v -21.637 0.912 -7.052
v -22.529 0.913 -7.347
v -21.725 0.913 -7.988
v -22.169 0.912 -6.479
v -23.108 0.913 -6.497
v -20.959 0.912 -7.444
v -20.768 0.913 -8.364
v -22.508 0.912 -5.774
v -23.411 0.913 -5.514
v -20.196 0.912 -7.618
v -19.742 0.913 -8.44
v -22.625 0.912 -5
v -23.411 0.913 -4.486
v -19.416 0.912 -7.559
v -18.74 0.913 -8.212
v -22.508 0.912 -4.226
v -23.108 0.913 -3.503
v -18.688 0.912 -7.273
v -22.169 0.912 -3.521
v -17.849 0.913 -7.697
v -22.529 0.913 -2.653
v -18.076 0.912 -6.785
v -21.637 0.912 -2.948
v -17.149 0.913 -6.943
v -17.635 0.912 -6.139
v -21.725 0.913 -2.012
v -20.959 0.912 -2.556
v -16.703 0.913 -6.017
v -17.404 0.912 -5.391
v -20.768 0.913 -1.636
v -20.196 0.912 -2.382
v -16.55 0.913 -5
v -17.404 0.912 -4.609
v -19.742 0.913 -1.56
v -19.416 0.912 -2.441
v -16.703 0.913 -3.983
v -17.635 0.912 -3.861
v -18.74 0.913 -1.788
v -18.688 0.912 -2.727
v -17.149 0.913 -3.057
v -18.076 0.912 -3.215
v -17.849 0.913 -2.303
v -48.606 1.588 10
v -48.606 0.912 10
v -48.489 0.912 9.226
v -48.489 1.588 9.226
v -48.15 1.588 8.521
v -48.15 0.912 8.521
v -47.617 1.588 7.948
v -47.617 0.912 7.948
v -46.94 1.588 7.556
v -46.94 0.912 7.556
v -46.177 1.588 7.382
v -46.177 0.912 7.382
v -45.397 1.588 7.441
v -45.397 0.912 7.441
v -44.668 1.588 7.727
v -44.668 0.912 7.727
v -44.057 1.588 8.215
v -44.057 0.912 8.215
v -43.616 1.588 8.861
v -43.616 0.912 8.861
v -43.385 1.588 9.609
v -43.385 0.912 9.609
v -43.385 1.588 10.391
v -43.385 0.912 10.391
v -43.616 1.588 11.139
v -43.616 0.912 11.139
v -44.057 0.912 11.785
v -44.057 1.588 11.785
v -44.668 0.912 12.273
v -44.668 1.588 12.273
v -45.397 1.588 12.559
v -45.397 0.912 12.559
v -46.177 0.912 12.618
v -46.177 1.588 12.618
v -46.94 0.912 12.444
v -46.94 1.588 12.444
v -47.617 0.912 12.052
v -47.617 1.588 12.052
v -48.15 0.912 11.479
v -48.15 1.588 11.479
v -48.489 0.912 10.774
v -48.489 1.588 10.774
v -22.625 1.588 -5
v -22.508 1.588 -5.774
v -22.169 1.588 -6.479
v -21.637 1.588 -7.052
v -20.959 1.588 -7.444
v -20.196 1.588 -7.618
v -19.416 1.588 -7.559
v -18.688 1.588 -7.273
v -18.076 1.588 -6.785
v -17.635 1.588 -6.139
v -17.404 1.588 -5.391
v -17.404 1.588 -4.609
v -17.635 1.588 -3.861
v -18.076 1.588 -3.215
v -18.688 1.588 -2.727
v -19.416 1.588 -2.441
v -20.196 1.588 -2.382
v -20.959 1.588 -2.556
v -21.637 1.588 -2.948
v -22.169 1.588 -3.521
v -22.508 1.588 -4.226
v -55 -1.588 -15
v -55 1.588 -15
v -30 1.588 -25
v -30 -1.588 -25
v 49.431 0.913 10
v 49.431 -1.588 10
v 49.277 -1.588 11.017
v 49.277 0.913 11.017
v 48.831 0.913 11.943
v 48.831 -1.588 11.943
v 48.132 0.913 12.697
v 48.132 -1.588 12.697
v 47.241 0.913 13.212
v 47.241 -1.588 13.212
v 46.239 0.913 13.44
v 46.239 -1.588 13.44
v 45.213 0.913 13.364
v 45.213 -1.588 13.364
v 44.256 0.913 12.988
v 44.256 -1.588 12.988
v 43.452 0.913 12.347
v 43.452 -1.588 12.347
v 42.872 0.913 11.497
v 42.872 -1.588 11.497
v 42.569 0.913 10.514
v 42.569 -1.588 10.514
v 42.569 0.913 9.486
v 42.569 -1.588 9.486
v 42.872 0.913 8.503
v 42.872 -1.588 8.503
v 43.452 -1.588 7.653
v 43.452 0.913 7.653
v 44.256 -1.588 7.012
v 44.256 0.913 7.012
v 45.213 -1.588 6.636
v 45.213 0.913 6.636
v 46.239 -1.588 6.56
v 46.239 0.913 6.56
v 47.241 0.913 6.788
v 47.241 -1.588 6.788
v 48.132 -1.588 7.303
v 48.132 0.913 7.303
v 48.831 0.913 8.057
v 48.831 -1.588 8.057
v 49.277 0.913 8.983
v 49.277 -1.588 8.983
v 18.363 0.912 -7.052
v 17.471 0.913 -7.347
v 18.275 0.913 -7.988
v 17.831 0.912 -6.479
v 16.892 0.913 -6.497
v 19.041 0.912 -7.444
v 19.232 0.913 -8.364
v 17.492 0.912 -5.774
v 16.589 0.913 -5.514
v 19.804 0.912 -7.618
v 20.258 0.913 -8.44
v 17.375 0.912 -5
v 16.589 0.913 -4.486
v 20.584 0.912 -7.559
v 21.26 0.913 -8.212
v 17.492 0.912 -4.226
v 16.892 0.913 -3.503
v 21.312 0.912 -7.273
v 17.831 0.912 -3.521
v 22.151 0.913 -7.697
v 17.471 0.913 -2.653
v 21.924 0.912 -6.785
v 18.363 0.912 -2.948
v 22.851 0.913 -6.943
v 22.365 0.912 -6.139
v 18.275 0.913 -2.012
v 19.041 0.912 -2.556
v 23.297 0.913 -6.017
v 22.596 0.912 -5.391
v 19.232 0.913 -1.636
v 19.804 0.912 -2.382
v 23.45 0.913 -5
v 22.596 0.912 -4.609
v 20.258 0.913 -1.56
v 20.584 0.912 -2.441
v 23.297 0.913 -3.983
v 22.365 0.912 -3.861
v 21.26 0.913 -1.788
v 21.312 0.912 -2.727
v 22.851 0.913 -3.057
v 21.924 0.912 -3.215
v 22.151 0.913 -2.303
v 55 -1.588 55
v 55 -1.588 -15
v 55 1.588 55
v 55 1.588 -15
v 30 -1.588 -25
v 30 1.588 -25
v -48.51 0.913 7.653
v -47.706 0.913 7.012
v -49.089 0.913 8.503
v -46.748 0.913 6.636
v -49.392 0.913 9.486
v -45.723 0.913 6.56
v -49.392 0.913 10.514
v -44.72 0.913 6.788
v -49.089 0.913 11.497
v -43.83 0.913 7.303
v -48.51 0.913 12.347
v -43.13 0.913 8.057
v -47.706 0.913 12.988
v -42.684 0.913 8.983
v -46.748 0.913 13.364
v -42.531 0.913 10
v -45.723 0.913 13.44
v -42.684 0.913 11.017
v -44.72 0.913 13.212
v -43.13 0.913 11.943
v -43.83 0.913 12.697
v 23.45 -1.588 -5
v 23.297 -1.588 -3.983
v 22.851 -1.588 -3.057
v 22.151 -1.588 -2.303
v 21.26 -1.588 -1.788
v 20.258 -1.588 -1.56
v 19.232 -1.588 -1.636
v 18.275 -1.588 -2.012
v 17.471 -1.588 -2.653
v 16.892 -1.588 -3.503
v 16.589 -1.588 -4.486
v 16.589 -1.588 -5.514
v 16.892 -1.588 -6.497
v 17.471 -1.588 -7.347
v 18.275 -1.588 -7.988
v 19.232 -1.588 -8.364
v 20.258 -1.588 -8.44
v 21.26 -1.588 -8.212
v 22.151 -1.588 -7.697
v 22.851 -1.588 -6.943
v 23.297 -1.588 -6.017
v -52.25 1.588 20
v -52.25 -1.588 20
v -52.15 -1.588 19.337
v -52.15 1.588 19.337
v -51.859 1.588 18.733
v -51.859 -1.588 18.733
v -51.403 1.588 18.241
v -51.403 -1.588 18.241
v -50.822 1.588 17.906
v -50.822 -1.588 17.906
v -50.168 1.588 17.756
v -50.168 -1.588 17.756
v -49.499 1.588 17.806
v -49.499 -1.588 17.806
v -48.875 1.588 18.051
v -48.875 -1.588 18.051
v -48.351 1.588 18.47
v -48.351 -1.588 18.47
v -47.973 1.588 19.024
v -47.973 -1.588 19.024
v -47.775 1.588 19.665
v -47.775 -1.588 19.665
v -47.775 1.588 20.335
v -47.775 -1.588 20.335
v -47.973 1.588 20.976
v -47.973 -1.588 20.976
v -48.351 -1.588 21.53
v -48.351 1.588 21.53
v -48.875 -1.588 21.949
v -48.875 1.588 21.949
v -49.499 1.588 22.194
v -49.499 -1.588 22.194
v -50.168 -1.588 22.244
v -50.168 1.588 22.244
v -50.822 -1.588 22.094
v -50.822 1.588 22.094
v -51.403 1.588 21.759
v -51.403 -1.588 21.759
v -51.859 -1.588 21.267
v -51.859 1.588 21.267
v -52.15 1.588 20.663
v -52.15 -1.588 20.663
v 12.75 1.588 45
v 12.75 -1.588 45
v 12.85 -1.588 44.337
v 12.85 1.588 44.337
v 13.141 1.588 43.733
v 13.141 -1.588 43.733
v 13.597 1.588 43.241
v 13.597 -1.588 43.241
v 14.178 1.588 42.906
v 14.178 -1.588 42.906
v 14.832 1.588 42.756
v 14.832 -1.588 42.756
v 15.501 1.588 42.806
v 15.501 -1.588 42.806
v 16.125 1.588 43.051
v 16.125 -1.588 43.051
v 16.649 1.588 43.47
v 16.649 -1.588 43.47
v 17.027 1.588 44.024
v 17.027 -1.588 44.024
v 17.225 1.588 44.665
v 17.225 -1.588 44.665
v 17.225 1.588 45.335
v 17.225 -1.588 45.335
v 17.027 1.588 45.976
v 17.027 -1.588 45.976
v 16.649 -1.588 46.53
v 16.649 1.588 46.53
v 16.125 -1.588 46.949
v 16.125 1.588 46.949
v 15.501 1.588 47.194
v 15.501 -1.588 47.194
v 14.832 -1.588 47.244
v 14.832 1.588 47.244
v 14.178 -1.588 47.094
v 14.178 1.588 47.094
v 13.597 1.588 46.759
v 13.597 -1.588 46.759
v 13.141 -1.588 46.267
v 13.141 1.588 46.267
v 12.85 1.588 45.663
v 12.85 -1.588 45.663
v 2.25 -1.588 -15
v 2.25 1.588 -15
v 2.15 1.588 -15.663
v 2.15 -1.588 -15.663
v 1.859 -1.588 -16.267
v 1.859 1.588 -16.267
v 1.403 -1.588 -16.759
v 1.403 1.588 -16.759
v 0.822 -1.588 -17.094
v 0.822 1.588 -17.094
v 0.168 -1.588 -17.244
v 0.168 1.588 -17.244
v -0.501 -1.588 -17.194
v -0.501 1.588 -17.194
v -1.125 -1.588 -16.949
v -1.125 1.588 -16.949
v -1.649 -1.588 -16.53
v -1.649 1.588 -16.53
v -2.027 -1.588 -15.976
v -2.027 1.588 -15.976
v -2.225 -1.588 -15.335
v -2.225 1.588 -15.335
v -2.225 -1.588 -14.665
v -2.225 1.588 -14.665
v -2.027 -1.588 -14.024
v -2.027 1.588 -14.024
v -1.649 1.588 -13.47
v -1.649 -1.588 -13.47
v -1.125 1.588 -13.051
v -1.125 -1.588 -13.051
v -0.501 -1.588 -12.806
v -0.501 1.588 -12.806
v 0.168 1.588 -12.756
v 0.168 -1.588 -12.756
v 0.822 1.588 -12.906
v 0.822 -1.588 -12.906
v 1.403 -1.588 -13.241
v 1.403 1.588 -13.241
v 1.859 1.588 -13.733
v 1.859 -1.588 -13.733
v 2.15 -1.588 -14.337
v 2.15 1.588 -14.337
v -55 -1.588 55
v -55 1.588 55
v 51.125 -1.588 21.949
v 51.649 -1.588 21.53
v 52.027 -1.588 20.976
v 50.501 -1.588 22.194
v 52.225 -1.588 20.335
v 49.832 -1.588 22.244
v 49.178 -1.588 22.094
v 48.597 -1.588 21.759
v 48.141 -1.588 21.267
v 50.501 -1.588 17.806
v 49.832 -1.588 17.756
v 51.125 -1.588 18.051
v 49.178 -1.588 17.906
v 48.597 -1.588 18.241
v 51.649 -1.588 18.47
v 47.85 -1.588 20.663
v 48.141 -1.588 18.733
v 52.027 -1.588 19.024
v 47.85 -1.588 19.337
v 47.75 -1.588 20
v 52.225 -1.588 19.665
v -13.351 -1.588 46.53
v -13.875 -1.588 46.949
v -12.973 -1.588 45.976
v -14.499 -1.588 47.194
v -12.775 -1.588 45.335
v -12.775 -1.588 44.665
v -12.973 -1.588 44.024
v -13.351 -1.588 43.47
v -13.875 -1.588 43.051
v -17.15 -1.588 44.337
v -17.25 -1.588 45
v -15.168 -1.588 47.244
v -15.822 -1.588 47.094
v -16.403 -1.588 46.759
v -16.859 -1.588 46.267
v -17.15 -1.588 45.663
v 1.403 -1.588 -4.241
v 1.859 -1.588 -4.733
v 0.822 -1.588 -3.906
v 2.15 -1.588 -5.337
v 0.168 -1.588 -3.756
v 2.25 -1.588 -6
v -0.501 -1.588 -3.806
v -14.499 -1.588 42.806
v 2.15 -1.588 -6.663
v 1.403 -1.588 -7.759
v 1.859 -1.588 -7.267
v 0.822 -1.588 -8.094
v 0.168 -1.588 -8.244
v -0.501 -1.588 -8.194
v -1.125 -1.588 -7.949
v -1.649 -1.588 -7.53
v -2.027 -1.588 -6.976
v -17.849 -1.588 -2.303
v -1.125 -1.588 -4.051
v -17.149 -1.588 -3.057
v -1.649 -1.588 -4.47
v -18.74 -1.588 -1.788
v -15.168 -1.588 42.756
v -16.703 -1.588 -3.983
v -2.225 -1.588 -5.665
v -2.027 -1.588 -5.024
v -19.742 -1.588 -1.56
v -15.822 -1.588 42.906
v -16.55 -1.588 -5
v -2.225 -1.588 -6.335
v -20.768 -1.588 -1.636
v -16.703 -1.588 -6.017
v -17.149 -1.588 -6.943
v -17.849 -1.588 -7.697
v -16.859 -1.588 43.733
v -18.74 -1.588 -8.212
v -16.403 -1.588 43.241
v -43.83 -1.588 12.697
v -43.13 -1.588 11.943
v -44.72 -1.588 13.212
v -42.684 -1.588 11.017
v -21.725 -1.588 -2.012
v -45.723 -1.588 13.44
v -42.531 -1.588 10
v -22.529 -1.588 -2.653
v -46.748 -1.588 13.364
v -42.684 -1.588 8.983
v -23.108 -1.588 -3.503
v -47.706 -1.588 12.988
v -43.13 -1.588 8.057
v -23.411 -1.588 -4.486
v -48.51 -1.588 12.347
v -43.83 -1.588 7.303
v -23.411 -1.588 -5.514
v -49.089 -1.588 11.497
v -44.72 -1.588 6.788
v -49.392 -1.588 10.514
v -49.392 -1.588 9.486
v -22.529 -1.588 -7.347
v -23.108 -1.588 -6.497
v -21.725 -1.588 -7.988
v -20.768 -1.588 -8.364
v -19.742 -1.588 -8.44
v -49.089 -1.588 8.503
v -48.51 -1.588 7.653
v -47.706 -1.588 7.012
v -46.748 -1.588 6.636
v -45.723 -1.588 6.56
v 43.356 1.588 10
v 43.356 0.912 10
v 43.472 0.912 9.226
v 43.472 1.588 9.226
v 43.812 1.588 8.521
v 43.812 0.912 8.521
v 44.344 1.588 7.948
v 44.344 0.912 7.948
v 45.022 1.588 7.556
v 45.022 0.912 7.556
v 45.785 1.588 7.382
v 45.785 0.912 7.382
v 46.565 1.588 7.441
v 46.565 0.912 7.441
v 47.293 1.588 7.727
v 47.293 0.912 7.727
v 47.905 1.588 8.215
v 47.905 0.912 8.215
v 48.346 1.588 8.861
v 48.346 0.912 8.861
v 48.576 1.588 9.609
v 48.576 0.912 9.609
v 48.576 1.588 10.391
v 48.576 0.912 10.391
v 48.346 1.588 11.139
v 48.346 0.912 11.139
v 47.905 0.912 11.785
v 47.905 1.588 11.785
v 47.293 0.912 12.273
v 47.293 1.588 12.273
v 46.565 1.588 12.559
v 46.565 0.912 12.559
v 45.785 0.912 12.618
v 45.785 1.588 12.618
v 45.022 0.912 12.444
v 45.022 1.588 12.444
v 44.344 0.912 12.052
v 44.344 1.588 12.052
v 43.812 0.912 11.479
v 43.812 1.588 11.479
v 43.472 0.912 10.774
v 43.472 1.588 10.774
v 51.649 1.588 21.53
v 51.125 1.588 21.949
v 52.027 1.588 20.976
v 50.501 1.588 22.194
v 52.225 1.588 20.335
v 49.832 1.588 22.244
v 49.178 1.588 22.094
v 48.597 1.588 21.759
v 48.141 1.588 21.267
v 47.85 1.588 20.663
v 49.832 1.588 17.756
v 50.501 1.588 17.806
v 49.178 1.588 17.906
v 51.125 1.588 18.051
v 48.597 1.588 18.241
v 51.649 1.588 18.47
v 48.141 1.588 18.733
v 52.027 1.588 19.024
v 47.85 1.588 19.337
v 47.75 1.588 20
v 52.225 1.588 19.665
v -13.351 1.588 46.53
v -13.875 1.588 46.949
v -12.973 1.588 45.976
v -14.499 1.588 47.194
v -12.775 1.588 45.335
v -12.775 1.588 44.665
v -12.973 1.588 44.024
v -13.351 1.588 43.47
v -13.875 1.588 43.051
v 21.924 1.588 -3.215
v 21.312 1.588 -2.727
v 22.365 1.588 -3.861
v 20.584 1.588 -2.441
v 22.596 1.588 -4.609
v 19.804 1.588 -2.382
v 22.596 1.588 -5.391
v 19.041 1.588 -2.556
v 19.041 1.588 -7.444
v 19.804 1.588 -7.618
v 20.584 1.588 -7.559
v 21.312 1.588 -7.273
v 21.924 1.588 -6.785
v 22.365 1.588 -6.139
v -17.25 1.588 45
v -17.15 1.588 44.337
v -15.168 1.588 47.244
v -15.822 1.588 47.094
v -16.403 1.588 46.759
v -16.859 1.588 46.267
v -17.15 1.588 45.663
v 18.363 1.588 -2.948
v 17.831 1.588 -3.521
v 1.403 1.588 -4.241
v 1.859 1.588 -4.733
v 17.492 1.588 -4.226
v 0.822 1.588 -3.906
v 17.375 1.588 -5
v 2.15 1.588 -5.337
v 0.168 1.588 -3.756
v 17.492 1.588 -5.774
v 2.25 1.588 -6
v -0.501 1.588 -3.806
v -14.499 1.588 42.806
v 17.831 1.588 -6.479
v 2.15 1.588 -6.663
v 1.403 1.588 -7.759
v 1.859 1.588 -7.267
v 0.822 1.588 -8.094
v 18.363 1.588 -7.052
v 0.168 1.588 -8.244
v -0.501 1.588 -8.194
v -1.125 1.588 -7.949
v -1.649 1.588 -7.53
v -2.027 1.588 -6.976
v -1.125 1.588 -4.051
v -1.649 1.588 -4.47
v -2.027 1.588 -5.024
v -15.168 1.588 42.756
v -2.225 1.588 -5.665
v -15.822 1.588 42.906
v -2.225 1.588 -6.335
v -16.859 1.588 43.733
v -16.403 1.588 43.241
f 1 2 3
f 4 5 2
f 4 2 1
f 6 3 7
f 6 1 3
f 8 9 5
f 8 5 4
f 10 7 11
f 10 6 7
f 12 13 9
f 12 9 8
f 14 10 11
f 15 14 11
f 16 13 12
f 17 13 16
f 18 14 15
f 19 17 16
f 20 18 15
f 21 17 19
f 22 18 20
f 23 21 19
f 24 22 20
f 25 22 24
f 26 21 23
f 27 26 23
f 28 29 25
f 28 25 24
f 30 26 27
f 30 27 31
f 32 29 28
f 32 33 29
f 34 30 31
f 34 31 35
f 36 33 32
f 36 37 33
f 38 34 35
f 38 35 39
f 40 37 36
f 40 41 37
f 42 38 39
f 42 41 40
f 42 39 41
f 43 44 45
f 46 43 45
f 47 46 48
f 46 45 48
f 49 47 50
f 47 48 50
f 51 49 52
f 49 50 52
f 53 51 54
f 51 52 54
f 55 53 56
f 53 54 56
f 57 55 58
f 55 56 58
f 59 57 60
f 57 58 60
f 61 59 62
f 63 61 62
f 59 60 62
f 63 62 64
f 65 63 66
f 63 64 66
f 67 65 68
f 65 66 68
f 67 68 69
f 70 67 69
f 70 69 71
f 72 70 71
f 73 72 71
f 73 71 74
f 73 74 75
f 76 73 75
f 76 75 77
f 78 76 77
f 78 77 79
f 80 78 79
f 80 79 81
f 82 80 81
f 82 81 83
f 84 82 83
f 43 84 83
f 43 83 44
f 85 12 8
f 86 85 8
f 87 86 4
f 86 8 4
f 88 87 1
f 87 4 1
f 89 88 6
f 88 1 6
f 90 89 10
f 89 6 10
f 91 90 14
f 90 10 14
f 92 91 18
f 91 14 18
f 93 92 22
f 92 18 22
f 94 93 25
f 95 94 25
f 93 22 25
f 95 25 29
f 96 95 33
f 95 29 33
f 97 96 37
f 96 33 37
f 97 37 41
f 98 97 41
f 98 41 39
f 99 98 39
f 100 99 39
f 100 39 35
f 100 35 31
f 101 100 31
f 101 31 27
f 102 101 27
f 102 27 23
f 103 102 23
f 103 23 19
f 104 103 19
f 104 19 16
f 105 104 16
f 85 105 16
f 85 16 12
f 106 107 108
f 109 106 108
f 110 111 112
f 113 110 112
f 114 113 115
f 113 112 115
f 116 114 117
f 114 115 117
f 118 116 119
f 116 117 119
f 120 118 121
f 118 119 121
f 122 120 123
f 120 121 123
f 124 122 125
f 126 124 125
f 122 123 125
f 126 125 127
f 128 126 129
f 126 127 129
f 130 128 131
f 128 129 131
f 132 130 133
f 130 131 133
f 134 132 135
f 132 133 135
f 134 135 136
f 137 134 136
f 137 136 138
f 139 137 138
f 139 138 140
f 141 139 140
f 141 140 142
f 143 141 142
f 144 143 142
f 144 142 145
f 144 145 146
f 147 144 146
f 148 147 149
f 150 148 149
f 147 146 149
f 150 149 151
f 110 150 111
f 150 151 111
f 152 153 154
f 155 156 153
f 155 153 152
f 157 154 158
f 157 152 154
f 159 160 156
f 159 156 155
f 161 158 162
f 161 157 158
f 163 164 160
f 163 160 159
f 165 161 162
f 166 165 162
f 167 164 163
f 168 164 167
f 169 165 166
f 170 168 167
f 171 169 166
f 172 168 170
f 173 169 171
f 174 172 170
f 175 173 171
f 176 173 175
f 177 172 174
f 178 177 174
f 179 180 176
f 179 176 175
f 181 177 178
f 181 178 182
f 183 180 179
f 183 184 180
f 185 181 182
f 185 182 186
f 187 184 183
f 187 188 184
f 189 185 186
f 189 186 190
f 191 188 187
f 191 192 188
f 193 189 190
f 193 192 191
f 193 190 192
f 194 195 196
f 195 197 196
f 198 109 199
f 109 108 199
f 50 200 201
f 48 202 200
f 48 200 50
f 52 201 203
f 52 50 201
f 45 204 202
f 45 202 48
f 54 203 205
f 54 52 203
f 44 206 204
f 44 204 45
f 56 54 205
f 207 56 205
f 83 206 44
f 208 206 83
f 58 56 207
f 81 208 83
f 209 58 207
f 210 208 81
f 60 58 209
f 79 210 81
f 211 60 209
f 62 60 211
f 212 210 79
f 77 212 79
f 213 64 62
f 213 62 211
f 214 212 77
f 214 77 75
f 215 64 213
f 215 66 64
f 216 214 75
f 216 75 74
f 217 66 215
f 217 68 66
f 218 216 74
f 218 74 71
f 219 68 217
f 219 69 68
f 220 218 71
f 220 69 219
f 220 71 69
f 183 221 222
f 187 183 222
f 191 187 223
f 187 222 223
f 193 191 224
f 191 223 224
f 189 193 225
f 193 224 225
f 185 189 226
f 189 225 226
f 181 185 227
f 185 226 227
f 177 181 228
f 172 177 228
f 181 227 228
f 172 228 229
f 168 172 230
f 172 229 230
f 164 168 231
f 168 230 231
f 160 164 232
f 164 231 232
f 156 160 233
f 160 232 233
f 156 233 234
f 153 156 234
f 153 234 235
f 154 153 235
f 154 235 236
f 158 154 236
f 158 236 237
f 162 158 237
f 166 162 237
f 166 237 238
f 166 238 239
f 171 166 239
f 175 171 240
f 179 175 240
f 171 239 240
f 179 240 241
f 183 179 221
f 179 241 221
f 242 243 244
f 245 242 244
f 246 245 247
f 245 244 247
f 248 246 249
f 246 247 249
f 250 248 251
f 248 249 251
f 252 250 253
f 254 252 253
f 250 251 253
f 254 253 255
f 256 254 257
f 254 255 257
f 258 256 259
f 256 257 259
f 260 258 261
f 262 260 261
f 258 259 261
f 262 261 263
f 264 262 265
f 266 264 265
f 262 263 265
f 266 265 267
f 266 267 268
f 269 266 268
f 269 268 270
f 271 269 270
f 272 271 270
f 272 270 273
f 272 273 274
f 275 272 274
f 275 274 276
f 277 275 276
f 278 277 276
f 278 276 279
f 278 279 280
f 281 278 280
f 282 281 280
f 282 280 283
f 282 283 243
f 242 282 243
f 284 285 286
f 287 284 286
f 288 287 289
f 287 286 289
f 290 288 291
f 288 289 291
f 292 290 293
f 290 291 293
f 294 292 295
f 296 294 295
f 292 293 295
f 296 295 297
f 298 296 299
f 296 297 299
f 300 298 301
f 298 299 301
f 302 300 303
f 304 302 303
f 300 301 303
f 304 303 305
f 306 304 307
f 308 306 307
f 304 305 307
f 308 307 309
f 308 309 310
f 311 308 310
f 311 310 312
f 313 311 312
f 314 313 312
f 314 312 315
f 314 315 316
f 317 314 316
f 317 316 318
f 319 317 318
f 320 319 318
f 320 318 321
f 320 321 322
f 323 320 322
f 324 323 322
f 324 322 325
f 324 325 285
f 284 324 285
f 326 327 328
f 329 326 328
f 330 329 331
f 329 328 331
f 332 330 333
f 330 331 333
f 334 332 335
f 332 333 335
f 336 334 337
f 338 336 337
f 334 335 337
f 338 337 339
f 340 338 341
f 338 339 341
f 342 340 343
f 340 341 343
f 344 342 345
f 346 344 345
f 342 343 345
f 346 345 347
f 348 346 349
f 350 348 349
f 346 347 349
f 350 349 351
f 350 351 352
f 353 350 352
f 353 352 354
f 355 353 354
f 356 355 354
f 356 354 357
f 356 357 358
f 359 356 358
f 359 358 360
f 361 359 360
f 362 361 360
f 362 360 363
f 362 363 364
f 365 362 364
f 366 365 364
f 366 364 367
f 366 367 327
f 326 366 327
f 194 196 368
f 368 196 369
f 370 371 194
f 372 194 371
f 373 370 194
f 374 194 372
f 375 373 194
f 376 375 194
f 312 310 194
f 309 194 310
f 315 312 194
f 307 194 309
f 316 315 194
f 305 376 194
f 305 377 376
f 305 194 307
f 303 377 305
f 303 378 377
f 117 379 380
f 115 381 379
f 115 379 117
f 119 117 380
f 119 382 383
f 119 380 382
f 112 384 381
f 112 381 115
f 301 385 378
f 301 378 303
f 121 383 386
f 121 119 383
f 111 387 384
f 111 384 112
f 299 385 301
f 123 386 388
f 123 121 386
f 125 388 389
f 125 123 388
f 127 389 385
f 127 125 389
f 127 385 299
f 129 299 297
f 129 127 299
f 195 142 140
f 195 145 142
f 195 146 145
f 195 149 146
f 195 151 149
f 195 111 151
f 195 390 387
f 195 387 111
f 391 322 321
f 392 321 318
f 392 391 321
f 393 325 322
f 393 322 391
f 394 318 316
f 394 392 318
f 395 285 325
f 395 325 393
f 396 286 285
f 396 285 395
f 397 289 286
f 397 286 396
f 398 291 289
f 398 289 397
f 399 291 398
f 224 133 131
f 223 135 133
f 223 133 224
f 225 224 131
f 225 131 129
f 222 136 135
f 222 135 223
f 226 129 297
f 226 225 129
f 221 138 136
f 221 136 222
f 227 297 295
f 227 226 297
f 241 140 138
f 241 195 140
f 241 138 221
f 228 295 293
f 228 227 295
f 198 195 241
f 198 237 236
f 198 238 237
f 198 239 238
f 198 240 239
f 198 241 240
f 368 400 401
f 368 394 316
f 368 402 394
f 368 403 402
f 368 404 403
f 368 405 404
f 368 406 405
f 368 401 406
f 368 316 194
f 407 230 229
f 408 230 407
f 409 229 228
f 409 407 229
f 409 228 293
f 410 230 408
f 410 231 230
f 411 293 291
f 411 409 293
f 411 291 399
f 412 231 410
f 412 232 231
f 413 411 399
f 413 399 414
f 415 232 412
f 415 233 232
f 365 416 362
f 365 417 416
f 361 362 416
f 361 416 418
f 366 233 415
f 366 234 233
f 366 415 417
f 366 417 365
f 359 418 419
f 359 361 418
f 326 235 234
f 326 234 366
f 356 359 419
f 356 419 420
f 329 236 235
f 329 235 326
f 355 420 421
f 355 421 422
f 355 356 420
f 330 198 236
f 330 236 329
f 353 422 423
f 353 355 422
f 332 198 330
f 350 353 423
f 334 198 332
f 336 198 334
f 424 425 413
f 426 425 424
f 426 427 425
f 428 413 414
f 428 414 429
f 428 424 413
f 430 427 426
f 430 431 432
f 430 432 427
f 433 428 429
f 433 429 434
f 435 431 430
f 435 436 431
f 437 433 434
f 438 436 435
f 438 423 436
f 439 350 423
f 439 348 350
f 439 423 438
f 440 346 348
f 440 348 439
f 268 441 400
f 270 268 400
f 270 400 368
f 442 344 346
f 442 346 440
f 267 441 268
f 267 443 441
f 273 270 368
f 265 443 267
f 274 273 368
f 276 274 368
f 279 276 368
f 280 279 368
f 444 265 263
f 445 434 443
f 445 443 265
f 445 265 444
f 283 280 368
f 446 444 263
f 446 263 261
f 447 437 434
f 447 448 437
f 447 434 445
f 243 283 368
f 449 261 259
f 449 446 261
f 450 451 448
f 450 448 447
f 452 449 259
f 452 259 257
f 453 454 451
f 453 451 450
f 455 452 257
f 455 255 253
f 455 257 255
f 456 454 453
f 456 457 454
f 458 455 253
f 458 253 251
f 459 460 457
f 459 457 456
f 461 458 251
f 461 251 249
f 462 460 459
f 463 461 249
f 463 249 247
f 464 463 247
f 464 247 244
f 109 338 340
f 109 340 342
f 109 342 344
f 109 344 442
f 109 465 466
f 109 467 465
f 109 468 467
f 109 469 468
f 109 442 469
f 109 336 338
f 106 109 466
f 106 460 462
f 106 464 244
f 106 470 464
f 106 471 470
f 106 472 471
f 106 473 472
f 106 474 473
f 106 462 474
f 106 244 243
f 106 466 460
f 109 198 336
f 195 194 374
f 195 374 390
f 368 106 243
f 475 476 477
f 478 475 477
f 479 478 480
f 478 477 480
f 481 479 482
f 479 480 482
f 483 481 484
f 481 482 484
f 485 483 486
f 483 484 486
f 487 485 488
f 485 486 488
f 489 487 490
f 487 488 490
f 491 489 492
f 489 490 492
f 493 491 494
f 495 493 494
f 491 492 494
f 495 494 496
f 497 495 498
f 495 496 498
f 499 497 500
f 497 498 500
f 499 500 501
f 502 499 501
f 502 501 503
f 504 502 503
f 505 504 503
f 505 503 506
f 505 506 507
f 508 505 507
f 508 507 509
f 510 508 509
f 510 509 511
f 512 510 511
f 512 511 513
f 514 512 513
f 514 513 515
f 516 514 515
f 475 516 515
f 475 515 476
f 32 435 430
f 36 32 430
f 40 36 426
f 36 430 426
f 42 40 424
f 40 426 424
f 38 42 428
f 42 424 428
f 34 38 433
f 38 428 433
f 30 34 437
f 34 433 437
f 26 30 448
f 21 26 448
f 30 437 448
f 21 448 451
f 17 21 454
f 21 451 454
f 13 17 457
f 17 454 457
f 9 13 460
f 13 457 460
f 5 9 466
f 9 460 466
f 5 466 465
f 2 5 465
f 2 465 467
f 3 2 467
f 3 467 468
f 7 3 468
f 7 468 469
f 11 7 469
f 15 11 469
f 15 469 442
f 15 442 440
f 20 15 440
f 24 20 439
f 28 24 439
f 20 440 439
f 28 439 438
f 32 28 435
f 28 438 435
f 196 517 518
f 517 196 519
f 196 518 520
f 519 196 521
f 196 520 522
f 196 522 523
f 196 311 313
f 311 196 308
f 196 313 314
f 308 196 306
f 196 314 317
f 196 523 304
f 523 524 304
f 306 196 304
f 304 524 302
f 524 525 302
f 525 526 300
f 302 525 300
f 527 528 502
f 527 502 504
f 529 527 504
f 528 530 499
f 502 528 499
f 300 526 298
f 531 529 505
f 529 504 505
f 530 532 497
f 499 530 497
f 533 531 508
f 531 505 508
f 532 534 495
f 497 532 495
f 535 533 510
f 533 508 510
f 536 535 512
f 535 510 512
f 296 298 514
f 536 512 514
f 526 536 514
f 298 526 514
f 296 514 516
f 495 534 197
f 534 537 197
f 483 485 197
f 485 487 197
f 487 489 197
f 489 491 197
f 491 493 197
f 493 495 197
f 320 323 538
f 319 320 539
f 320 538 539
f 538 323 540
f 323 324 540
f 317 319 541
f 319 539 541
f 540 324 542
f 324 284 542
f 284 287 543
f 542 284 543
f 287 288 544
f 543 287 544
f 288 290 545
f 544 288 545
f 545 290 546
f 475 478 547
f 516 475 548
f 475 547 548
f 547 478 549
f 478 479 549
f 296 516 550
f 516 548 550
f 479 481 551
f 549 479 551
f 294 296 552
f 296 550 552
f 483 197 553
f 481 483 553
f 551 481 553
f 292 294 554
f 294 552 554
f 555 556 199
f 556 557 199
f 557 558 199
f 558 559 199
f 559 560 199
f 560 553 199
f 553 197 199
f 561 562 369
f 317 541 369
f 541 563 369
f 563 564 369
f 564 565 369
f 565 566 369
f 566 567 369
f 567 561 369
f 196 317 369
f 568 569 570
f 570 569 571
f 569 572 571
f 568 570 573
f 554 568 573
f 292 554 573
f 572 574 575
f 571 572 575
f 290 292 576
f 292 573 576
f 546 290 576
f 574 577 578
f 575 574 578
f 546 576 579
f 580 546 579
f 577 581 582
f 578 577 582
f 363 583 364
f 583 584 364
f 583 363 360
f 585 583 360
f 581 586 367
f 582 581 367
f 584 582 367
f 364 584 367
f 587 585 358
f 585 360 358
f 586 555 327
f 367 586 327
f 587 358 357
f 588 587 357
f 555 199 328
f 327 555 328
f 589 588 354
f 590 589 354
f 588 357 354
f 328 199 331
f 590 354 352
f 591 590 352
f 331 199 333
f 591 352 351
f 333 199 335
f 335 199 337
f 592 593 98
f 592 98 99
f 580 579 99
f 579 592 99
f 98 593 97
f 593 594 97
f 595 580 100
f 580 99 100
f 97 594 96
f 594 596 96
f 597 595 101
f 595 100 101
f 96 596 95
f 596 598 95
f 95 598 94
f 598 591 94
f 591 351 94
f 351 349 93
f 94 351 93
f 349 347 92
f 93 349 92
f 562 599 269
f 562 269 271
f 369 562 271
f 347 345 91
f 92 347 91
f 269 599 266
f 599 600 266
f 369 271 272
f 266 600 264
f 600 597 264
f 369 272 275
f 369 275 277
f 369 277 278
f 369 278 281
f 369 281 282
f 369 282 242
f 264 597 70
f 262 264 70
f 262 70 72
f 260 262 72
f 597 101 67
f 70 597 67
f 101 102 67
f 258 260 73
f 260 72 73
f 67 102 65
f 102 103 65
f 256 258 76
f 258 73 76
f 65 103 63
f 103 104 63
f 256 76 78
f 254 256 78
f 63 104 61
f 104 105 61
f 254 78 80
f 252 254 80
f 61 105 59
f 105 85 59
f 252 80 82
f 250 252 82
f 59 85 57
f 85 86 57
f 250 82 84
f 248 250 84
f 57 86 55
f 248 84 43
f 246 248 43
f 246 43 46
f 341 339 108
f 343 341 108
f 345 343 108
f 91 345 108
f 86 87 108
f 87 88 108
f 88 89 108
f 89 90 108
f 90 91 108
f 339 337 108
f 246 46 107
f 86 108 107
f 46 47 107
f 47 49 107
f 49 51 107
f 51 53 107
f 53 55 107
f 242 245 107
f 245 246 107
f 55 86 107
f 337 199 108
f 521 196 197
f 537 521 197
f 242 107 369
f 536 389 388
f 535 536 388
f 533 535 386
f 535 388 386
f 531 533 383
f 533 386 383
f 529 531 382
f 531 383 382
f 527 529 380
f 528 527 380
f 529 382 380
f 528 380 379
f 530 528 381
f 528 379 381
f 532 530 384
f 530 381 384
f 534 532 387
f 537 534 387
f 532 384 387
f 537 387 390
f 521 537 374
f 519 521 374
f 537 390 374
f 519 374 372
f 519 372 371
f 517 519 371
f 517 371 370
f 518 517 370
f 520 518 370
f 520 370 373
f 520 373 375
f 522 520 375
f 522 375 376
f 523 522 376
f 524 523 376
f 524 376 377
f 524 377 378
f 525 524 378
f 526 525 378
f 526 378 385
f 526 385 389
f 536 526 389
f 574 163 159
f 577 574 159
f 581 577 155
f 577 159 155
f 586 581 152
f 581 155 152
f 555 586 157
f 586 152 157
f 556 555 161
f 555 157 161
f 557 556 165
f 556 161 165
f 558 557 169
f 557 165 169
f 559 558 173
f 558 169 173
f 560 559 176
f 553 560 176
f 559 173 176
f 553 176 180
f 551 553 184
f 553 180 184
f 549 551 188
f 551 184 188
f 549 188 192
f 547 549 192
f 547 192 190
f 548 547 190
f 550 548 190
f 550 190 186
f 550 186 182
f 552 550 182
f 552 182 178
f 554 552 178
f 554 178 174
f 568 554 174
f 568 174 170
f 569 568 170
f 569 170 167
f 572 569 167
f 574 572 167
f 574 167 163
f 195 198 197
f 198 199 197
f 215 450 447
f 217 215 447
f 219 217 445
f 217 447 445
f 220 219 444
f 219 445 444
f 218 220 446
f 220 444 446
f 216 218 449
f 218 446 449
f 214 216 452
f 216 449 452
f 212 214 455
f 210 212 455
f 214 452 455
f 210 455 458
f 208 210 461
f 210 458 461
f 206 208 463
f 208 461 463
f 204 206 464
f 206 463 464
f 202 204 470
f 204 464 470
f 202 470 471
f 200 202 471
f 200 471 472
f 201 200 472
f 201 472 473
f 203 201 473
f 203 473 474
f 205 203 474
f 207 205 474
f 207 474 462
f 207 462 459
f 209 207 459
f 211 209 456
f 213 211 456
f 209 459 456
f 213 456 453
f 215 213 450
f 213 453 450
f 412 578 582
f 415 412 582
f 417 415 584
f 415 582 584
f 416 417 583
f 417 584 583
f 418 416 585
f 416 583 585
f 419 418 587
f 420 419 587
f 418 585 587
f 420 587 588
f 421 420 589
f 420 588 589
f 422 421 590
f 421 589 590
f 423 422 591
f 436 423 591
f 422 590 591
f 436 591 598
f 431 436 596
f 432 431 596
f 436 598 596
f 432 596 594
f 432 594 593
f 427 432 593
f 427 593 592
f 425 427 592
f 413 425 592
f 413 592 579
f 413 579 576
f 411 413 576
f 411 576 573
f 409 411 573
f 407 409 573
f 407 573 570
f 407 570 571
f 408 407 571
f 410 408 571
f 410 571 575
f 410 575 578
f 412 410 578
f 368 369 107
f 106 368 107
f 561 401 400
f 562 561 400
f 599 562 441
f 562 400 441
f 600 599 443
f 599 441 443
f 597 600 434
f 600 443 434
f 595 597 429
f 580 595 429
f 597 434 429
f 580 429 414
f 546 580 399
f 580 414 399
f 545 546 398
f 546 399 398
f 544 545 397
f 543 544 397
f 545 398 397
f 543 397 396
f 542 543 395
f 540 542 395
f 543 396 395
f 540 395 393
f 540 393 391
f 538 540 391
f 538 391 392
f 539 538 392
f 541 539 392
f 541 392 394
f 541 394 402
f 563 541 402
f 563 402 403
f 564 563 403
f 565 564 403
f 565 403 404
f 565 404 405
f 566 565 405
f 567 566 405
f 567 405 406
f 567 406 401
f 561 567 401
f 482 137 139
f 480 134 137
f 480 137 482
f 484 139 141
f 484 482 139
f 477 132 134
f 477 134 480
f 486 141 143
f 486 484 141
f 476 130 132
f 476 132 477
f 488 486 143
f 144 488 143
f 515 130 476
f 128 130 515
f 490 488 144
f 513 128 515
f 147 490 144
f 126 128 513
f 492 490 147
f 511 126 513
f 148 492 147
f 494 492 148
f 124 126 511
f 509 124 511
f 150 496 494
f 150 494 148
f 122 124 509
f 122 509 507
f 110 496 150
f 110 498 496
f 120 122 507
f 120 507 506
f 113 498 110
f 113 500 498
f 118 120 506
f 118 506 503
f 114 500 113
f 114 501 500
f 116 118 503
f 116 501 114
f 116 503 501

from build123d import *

# Parameters (mm, degrees)
BOSS_EXTRUDE1_DEPTH   = 1.5875
F_1_0MM_DOWEL_HOLE1_D = 5.25
SKETCH6_R             = 3.45
CUT_EXTRUDE2_DEPTH    = 2.5
M4_CLEARANCE_HOLE1_D  = 4.5
M4_CLEARANCE_HOLE2_D  = 4.5
M4_CLEARANCE_HOLE3_D  = 4.5


with BuildPart() as part:
    # Sketch1 → Boss-Extrude1 (new body, symmetric)
    with BuildSketch(Plane(origin=(0, 0, 0), x_dir=(1, 0, 0), z_dir=(0, 1, 0))):
        Polygon((-55, 15), (-30, 25), (30, 25), (55, 15), (55, -55), (-55, -55), align=None)
    extrude(amount=BOSS_EXTRUDE1_DEPTH, both=True)

    # Ø1.0mm Dowel Hole1 (through all)
    with Locations(Plane(origin=(0, 1.5875, 0), x_dir=(1, 0, 0), z_dir=(0, 1, 0))):
        with Locations((-20, 5), (20, 5), (45.980762114, -10), (-45.980762114, -10)):
            Hole(F_1_0MM_DOWEL_HOLE1_D / 2)

    # Sketch6 → Cut-Extrude2 (cut)
    with BuildSketch(Plane.XZ.offset(1.5875)):
        with Locations((-45.980762114, 10)):
            Circle(SKETCH6_R)
        with Locations((-20, -5)):
            Circle(SKETCH6_R)
        with Locations((20, -5)):
            Circle(SKETCH6_R)
        with Locations((45.980762114, 10)):
            Circle(SKETCH6_R)
    extrude(amount=-CUT_EXTRUDE2_DEPTH, mode=Mode.SUBTRACT)

    # M4 Clearance Hole1 (through all)
    with Locations(Plane(origin=(0, -1.5875, 0), x_dir=(-1, 0, 0), z_dir=(0, -1, 0))):
        with Locations((0, 15), (0, 6)):
            Hole(M4_CLEARANCE_HOLE1_D / 2)

    # M4 Clearance Hole2 (through all)
    with Locations(Plane(origin=(0, 1.5875, 0), x_dir=(1, 0, 0), z_dir=(0, 1, 0))):
        with Locations((-15, -45), (15, -45)):
            Hole(M4_CLEARANCE_HOLE2_D / 2)

    # M4 Clearance Hole3 (through all)
    with Locations(Plane(origin=(0, 1.5875, 0), x_dir=(1, 0, 0), z_dir=(0, 1, 0))):
        with Locations((-50, -20), (50, -20)):
            Hole(M4_CLEARANCE_HOLE3_D / 2)


solid = part.part
